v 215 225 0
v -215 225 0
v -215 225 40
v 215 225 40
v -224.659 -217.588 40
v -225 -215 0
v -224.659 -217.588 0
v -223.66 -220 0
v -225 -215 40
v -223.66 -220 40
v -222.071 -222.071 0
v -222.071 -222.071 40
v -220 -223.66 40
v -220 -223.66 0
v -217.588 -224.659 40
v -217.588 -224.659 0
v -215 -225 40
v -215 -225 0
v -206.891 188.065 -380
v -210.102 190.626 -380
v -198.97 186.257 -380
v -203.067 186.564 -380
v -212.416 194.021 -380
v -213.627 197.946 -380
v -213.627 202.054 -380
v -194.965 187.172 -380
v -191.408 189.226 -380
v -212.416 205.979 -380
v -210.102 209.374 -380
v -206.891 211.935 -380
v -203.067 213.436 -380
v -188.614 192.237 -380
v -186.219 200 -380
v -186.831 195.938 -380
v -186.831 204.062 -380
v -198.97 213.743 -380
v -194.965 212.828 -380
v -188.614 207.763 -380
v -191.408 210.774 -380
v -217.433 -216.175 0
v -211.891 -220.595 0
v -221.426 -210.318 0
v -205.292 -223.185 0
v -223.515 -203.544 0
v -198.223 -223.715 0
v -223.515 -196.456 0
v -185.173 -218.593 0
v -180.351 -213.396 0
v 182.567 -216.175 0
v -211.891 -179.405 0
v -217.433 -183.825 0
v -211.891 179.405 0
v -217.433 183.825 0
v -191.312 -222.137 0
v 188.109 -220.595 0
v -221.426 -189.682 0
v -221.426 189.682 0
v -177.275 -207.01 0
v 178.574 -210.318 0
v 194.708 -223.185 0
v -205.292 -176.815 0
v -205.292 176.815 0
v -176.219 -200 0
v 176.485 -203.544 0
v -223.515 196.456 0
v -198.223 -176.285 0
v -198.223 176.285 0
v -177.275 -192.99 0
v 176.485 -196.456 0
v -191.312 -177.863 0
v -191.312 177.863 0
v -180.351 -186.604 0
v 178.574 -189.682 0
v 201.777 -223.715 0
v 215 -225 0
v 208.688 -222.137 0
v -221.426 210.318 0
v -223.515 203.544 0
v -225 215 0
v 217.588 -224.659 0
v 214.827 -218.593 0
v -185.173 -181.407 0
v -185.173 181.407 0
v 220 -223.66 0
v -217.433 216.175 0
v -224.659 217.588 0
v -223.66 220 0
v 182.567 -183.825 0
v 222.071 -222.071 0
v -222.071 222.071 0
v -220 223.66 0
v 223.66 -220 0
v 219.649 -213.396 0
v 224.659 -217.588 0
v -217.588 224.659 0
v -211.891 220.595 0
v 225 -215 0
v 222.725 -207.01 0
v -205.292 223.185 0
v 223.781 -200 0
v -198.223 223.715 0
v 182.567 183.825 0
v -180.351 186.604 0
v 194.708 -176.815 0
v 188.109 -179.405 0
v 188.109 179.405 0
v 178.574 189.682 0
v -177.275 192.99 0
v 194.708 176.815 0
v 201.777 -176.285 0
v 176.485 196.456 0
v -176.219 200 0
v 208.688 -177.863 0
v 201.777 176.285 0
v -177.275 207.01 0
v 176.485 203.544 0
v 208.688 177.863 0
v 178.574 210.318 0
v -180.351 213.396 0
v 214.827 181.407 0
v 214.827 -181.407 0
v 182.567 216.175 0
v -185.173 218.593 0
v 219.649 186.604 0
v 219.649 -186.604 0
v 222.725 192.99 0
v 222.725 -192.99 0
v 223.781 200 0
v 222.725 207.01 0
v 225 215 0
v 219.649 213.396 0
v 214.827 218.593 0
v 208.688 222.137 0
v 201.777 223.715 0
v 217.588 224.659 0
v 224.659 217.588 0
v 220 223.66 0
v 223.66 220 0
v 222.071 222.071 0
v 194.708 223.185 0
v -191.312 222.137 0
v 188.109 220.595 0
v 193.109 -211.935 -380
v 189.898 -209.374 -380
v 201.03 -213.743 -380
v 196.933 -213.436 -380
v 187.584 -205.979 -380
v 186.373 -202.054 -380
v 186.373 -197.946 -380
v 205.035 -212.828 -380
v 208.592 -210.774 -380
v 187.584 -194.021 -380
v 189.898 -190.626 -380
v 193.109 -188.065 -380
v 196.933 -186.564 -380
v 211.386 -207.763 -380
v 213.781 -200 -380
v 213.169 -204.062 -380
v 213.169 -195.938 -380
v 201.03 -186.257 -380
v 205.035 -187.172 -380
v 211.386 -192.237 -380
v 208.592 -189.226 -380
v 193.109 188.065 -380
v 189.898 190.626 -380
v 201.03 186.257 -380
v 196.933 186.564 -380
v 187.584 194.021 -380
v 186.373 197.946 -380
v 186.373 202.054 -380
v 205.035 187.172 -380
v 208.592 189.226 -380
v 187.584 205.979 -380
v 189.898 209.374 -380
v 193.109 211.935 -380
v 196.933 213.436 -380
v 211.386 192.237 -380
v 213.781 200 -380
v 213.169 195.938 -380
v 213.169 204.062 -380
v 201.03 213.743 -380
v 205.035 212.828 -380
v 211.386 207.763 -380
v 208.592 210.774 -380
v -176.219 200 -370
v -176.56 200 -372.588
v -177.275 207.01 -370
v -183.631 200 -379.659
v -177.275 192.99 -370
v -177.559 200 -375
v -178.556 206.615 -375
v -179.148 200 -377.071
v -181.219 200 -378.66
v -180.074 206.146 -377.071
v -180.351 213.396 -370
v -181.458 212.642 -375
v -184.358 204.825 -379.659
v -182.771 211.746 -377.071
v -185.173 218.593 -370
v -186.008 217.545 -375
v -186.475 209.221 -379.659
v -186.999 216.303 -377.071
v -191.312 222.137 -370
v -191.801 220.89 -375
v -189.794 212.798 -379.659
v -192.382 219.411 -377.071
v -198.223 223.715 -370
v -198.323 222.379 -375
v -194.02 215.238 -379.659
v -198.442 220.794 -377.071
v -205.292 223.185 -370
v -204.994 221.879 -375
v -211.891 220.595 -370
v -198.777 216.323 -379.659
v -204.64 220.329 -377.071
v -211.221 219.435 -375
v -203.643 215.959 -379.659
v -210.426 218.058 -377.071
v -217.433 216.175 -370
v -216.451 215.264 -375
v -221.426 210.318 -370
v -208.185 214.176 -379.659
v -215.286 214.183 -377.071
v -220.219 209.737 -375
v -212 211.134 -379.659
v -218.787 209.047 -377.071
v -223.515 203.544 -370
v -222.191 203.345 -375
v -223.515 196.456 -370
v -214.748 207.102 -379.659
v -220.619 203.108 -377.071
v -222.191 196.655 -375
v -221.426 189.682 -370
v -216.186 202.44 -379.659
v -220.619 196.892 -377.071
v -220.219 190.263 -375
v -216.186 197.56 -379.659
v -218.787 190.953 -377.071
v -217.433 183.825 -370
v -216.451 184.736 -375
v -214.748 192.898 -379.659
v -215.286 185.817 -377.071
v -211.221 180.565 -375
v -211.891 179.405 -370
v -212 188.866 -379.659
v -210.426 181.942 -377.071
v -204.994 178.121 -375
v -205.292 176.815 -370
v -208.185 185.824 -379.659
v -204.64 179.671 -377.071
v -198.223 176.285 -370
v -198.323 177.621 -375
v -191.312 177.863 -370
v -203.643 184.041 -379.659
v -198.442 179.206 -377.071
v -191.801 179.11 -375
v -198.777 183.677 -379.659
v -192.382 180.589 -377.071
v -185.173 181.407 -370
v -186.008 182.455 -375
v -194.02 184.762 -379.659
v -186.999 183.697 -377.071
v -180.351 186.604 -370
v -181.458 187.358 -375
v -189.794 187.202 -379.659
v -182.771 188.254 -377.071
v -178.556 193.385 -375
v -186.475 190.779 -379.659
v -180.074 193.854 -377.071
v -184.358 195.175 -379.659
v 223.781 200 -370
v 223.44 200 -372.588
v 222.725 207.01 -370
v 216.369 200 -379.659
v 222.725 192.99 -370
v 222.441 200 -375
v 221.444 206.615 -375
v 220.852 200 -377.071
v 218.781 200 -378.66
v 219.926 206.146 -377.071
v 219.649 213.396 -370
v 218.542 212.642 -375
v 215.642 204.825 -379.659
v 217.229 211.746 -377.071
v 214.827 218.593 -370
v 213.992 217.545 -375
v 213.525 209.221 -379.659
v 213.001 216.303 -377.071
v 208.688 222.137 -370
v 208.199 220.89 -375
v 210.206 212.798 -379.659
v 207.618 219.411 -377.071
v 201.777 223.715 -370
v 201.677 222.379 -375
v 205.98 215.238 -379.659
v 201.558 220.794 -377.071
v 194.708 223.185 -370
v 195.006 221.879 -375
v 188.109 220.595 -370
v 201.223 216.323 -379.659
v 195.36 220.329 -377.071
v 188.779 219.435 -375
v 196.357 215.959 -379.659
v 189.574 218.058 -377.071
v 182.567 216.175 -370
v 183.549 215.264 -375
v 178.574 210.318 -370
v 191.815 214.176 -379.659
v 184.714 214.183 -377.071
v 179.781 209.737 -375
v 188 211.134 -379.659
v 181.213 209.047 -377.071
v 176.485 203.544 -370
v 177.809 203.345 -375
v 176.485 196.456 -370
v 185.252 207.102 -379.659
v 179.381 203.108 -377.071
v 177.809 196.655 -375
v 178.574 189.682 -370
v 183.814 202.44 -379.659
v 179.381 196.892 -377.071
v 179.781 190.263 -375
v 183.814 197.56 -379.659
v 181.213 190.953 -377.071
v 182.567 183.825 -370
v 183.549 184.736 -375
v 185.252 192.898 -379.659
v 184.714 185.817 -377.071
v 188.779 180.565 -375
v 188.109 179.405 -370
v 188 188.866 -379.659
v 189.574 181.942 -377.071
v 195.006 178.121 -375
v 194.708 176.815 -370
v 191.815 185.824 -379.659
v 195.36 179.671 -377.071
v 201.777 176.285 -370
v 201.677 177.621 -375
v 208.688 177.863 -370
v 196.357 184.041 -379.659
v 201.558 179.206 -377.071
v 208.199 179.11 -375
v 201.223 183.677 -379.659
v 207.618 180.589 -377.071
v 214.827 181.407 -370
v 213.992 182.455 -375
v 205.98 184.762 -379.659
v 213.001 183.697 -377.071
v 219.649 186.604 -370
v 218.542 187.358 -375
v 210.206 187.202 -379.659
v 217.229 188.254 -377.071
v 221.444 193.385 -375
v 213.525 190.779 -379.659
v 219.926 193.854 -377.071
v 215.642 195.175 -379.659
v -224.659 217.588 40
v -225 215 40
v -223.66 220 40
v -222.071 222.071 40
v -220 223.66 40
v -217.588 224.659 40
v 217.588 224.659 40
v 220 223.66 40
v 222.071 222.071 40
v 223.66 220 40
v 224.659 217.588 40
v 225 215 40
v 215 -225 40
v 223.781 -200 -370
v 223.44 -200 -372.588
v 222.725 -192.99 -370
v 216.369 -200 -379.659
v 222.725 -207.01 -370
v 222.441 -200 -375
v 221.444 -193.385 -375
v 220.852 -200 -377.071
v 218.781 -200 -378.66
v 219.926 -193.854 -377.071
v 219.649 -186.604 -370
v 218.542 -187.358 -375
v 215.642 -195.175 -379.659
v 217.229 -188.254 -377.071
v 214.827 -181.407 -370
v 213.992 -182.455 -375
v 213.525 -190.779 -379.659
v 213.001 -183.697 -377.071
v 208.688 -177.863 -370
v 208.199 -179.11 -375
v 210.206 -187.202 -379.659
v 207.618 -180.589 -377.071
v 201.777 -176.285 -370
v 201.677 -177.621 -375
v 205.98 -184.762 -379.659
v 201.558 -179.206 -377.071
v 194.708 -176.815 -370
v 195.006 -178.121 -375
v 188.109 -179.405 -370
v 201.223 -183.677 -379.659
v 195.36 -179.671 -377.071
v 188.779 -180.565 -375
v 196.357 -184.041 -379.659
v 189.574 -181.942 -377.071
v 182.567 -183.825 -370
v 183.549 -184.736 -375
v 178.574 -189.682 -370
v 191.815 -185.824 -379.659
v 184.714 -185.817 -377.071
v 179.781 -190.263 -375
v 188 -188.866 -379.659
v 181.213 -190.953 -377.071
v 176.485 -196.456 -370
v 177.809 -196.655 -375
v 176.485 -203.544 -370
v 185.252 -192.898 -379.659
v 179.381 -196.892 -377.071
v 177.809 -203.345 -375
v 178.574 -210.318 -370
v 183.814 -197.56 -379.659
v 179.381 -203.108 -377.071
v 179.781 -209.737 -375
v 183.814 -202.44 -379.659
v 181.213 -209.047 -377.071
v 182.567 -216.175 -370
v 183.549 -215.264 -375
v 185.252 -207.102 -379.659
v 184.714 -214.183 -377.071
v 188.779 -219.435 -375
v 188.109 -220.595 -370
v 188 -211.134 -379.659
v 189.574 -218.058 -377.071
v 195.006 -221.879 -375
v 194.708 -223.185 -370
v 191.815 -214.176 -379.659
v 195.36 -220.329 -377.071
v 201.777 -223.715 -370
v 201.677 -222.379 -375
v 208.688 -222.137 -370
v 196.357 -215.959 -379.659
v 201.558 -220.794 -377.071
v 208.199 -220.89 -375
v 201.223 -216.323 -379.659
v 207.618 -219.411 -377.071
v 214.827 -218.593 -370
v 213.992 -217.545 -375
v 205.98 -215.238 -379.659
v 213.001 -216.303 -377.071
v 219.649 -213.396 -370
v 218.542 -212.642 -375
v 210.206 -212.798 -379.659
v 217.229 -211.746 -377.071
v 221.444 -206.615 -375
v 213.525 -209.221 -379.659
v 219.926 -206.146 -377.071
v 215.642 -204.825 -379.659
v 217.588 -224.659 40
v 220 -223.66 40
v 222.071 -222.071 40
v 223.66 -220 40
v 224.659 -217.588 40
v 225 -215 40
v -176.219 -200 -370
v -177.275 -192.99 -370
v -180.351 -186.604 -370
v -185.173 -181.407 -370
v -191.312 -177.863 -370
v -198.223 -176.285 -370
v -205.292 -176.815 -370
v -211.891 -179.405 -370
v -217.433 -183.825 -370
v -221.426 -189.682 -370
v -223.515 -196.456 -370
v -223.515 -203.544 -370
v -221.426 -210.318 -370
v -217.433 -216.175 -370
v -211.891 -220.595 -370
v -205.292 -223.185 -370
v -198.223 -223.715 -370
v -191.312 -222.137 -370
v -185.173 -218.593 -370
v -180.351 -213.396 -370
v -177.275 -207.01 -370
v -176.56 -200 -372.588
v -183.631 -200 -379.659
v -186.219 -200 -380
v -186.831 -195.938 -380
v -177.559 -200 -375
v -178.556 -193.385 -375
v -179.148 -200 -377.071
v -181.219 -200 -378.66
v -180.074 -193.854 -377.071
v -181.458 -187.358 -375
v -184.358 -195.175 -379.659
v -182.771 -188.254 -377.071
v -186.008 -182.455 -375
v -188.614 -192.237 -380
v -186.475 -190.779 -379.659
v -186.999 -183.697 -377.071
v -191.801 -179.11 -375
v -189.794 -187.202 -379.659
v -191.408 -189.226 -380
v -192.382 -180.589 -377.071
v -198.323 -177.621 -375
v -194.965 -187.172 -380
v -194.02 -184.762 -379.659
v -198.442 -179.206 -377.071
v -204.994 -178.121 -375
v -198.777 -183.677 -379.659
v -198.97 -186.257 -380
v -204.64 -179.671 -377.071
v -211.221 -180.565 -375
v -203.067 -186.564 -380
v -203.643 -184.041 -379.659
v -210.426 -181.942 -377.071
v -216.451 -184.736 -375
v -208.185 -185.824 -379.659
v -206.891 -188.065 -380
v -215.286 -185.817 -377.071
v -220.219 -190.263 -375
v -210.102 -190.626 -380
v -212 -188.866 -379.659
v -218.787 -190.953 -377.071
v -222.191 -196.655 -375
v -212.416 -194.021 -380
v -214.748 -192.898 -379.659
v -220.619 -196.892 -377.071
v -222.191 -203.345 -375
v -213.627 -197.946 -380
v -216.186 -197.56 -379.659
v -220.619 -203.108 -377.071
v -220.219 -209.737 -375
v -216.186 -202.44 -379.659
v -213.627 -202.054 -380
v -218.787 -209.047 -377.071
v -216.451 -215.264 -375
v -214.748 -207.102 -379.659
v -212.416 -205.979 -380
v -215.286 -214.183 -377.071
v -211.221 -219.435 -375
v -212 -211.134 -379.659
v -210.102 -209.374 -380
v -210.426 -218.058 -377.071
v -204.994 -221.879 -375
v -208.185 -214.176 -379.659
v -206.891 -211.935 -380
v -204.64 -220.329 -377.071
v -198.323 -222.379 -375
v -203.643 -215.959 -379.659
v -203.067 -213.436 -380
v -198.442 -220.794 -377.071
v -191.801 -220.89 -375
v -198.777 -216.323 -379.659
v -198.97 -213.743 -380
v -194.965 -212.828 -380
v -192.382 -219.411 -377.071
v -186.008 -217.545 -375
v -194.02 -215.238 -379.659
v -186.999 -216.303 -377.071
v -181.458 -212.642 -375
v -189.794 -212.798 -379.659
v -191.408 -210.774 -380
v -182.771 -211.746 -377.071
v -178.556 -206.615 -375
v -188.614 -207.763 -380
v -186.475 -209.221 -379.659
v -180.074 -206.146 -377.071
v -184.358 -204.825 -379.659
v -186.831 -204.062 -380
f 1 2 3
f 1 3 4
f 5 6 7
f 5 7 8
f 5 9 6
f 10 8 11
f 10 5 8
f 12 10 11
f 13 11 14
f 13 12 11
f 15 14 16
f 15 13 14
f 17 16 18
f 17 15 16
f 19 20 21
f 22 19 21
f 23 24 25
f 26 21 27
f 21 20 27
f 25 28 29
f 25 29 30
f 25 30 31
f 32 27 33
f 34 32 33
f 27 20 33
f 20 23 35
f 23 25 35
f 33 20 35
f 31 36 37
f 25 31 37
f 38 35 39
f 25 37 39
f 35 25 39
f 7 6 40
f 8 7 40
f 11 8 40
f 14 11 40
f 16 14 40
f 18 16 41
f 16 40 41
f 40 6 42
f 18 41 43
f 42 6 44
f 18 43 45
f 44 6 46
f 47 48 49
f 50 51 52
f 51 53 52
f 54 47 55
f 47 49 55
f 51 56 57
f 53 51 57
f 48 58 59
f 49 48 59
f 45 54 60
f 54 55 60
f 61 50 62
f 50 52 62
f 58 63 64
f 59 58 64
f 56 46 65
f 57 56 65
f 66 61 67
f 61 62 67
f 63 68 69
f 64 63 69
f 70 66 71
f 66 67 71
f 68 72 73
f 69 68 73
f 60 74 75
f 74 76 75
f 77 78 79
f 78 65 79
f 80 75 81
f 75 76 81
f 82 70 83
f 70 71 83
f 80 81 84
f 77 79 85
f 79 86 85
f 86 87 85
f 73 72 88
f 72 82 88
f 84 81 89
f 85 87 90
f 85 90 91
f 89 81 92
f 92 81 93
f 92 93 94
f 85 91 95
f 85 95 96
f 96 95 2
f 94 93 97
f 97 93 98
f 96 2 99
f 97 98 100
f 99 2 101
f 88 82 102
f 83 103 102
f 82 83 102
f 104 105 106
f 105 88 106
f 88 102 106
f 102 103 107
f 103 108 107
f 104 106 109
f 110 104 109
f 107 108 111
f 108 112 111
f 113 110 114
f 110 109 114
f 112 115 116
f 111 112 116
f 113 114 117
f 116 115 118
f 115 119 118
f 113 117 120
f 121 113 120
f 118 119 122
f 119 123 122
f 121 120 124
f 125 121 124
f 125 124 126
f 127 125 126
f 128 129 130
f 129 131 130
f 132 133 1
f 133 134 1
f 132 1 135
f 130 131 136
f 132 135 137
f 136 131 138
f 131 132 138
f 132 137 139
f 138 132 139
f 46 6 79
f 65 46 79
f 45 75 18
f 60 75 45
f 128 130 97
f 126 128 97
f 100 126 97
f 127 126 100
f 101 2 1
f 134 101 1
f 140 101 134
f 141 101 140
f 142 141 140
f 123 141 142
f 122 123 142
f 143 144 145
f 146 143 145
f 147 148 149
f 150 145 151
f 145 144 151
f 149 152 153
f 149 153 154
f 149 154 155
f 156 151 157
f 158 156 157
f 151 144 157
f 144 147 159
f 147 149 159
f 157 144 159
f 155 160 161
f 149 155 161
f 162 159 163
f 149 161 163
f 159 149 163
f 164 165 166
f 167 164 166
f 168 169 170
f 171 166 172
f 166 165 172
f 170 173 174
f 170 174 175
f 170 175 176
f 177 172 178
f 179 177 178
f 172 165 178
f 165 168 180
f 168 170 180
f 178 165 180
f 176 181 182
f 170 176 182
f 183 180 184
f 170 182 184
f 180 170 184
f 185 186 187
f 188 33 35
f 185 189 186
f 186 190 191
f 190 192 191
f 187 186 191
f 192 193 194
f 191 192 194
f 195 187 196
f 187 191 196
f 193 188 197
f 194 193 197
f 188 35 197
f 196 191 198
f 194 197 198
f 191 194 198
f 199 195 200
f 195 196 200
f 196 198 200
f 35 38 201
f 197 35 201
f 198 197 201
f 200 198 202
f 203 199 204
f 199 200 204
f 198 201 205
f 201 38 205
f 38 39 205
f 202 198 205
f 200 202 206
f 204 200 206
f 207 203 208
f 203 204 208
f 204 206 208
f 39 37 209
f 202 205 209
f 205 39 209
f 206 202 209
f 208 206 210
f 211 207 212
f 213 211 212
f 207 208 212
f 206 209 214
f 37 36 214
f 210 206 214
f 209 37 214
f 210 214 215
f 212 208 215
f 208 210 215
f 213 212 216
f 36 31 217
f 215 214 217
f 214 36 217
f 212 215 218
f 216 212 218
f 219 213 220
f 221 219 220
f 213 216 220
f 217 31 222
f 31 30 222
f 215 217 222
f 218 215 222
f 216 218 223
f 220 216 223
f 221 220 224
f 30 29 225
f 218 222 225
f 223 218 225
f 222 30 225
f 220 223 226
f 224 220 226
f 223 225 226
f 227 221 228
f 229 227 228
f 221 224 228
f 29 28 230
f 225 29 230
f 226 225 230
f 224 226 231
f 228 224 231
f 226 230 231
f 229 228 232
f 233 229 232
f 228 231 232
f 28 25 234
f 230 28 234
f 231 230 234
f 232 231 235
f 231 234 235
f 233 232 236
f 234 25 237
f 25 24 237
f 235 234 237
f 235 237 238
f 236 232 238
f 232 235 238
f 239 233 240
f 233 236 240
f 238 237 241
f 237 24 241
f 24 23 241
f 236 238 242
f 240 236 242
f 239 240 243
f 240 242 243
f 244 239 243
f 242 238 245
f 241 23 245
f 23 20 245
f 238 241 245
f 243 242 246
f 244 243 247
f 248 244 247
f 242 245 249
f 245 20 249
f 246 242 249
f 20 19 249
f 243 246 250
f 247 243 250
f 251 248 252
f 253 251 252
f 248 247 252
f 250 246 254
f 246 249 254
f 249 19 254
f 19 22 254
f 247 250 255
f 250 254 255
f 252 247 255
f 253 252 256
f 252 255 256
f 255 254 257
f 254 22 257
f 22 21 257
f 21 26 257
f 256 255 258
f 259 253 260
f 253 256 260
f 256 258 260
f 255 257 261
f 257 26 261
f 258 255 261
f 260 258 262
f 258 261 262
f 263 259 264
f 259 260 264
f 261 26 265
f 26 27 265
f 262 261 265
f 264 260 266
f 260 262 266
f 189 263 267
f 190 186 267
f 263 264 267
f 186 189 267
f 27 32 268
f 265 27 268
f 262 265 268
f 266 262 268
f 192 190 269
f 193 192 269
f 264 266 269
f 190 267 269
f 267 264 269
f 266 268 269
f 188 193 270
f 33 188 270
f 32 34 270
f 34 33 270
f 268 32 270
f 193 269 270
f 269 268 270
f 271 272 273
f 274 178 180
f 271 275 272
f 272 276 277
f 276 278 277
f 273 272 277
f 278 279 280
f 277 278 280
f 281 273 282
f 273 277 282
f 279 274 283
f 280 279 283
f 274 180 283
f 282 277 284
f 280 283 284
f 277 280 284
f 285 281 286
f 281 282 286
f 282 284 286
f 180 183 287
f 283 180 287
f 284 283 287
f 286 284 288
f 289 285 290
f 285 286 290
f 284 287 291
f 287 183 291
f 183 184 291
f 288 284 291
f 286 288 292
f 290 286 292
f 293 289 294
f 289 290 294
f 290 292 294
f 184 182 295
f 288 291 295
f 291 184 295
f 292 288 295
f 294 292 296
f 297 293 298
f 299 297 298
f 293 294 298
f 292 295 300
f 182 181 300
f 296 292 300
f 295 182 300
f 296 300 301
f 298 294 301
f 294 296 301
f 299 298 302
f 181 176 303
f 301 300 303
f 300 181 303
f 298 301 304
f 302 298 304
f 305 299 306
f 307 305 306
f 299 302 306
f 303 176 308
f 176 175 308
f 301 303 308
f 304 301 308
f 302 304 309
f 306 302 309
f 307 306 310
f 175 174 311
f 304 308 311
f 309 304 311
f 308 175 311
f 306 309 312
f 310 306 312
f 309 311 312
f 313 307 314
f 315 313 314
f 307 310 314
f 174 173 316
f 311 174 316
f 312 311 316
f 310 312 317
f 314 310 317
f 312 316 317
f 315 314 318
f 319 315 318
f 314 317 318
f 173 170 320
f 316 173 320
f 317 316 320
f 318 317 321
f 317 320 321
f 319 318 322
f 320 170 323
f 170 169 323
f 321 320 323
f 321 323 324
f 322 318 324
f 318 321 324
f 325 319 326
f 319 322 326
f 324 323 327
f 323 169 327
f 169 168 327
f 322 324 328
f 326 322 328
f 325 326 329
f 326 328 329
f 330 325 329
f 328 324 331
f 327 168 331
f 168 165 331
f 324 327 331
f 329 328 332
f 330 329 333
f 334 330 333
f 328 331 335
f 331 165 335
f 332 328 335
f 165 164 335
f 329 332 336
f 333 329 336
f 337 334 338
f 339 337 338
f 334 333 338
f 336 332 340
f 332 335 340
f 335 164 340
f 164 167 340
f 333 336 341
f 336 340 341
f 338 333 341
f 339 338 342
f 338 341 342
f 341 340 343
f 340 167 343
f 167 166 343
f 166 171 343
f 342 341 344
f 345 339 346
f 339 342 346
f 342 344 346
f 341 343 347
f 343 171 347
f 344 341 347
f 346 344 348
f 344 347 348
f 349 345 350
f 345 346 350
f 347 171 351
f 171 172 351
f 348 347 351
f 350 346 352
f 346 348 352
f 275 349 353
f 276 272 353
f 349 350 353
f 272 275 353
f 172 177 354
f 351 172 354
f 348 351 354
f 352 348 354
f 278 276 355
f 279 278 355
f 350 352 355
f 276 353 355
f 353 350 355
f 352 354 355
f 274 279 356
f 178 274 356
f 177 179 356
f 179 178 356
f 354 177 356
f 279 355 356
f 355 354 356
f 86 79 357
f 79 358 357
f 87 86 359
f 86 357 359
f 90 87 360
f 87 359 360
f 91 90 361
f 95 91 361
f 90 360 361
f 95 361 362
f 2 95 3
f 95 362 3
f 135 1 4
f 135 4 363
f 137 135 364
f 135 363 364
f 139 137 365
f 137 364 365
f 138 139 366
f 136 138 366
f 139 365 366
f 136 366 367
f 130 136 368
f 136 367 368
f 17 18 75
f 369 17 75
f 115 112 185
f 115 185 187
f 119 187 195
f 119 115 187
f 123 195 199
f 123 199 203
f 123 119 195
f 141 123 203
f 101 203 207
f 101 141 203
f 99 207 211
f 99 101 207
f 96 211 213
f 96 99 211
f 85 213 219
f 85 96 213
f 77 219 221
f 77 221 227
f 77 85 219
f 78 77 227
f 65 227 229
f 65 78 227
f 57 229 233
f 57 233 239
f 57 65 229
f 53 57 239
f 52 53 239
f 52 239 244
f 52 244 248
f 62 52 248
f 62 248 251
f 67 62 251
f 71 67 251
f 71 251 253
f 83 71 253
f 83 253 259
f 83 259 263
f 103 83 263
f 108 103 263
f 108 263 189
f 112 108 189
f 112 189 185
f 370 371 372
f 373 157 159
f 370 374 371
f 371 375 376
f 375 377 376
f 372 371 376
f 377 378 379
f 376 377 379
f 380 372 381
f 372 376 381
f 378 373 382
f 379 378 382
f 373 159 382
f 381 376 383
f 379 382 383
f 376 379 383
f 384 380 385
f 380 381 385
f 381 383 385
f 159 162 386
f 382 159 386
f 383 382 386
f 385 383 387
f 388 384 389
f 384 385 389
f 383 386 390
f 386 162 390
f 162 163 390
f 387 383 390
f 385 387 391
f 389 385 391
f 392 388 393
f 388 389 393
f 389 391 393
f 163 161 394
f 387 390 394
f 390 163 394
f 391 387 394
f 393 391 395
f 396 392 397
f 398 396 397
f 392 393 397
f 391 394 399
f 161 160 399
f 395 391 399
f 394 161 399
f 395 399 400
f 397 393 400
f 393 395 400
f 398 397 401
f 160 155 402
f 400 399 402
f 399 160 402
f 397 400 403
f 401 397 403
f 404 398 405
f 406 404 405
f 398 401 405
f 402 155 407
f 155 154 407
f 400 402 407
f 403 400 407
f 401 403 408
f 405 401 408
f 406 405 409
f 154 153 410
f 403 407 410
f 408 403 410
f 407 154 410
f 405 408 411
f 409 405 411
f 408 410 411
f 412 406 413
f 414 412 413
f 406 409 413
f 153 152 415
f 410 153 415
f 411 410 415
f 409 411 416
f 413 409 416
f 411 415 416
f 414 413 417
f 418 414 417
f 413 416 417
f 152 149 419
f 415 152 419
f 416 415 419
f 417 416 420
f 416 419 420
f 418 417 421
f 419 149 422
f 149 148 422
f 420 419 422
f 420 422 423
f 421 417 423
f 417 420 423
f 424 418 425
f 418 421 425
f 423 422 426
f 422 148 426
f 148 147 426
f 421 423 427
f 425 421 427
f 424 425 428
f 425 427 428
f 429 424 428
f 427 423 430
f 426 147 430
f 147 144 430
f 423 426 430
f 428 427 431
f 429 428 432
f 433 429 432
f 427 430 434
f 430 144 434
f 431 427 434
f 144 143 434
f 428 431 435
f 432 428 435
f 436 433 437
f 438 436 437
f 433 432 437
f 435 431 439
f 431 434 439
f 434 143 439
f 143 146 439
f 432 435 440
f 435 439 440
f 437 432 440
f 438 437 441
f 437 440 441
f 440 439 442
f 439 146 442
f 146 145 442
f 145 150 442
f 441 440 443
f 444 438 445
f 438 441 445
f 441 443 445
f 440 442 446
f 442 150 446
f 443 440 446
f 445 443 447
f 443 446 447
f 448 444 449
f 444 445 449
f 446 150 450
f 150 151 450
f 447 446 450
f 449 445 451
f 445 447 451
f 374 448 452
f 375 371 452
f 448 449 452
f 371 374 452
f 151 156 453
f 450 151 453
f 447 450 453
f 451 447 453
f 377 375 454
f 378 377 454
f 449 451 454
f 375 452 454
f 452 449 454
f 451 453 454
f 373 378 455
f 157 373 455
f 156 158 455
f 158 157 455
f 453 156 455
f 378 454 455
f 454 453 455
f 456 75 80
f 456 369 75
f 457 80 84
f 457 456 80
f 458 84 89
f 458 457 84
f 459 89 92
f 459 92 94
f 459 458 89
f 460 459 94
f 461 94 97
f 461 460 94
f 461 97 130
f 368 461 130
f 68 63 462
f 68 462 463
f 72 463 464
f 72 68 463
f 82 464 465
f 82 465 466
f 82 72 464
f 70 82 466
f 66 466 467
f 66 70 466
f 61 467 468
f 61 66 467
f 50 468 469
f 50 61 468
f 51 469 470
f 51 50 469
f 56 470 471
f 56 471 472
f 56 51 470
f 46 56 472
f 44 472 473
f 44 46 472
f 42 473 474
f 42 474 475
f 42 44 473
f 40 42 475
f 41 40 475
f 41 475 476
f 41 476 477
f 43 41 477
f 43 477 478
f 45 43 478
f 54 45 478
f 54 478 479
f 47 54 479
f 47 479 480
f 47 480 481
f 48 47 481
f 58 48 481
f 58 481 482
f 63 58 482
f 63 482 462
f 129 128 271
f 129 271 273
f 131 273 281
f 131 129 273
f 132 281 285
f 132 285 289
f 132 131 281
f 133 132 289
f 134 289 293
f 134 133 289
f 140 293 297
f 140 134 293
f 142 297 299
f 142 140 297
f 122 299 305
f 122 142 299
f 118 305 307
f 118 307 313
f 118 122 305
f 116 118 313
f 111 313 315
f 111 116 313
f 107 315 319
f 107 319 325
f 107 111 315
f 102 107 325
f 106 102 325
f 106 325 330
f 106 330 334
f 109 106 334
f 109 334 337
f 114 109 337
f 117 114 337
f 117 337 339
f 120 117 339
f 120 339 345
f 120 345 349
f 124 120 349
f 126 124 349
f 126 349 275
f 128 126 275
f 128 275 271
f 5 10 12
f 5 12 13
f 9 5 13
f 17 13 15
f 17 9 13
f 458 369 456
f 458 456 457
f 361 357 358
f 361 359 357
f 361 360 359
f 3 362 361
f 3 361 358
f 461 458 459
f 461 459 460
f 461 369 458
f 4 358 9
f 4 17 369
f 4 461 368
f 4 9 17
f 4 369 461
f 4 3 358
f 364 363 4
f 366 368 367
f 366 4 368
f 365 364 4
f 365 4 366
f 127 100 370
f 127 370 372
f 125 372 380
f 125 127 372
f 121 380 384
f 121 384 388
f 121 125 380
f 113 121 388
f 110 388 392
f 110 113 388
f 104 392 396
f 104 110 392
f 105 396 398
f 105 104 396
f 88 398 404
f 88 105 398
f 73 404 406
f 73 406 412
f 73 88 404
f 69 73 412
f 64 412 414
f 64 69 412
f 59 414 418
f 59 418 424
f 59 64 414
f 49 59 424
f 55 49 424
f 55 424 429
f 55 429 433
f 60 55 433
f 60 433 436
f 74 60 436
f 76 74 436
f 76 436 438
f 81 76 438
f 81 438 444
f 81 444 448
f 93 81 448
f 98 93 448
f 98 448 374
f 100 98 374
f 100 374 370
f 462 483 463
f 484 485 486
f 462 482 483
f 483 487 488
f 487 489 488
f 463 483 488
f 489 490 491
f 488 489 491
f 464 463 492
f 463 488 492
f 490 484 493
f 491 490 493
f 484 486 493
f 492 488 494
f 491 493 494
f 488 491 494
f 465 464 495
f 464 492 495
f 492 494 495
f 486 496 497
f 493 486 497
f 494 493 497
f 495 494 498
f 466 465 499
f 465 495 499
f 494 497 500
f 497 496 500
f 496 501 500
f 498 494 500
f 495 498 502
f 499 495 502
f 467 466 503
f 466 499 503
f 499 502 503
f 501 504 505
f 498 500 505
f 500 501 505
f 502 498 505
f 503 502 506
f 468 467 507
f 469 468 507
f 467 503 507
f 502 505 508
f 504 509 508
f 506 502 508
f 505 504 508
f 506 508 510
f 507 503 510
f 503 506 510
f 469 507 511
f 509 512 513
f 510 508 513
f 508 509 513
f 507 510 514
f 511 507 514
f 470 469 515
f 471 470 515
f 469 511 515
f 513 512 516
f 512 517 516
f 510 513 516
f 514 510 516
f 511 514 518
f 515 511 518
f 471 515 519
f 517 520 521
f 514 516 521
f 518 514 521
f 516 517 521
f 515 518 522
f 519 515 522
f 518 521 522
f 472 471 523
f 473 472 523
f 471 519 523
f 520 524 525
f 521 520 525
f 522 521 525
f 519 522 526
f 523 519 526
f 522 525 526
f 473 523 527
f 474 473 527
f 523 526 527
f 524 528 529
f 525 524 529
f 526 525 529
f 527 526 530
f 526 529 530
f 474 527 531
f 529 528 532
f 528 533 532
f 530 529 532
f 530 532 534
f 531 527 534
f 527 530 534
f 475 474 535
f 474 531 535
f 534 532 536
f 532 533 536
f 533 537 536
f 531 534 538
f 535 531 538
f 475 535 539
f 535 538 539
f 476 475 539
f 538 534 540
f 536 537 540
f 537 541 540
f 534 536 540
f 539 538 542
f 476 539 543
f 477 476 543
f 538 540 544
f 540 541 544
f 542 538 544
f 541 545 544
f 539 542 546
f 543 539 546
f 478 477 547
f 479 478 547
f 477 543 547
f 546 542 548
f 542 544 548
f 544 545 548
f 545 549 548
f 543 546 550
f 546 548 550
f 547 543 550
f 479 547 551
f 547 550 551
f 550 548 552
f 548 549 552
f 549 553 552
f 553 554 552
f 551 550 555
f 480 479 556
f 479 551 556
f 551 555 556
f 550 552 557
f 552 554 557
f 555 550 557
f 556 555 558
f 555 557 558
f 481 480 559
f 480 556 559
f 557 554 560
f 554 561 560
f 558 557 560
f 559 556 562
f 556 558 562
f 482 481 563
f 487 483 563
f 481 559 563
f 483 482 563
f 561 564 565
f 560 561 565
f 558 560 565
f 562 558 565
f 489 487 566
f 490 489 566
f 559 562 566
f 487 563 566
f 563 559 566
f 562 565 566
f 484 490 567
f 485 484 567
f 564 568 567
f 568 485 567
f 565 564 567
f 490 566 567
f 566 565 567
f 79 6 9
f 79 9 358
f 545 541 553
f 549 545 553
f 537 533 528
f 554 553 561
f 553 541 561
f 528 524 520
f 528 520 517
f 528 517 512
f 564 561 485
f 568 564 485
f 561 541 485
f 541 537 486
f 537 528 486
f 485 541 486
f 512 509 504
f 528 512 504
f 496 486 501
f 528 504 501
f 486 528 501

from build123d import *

# Parameters (mm, degrees)
F0_W     = 450
F0_H     = 450
F0_R     = 23.781071
F1_DEPTH = 40
F2_R     = 23.781071
F3_DEPTH = 420
F4_R     = 10
F5_R     = 10


with BuildPart() as f1:
    # F0 (on Top) → F1 (new body)
    with BuildSketch(Plane.XY):
        Rectangle(F0_W, F0_H)
        with Locations((-200, -200)):
            Circle(F0_R, mode=Mode.SUBTRACT)
        with Locations((200, -200)):
            Circle(F0_R, mode=Mode.SUBTRACT)
        with Locations((-200, 200)):
            Circle(F0_R, mode=Mode.SUBTRACT)
        with Locations((200, 200)):
            Circle(F0_R, mode=Mode.SUBTRACT)
    extrude(amount=F1_DEPTH)

    # F2 (on face) → F3 (join)
    with BuildSketch(Plane.XY.offset(40)):
        with Locations((-200, -200)):
            Circle(F2_R)
        with Locations((-200, 200)):
            Circle(F2_R)
        with Locations((200, 200)):
            Circle(F2_R)
        with Locations((200, -200)):
            Circle(F2_R)
    extrude(amount=-F3_DEPTH)

    # F4
    f4_edges = [f1.edges().sort_by_distance(p)[0] for p in [
        (-223.781071, -200, -380),
        (176.218929, -200, -380),
        (176.218929, 200, -380),
        (-223.781071, 200, -380),
    ]]
    fillet(f4_edges, radius=F4_R)

    # F5
    f5_edges = [f1.edges().sort_by_distance(p)[0] for p in [
        (225, -225, 20),
        (225, 225, 20),
        (-225, -225, 20),
        (-225, 225, 20),
    ]]
    fillet(f5_edges, radius=F5_R)


solid = f1.part
